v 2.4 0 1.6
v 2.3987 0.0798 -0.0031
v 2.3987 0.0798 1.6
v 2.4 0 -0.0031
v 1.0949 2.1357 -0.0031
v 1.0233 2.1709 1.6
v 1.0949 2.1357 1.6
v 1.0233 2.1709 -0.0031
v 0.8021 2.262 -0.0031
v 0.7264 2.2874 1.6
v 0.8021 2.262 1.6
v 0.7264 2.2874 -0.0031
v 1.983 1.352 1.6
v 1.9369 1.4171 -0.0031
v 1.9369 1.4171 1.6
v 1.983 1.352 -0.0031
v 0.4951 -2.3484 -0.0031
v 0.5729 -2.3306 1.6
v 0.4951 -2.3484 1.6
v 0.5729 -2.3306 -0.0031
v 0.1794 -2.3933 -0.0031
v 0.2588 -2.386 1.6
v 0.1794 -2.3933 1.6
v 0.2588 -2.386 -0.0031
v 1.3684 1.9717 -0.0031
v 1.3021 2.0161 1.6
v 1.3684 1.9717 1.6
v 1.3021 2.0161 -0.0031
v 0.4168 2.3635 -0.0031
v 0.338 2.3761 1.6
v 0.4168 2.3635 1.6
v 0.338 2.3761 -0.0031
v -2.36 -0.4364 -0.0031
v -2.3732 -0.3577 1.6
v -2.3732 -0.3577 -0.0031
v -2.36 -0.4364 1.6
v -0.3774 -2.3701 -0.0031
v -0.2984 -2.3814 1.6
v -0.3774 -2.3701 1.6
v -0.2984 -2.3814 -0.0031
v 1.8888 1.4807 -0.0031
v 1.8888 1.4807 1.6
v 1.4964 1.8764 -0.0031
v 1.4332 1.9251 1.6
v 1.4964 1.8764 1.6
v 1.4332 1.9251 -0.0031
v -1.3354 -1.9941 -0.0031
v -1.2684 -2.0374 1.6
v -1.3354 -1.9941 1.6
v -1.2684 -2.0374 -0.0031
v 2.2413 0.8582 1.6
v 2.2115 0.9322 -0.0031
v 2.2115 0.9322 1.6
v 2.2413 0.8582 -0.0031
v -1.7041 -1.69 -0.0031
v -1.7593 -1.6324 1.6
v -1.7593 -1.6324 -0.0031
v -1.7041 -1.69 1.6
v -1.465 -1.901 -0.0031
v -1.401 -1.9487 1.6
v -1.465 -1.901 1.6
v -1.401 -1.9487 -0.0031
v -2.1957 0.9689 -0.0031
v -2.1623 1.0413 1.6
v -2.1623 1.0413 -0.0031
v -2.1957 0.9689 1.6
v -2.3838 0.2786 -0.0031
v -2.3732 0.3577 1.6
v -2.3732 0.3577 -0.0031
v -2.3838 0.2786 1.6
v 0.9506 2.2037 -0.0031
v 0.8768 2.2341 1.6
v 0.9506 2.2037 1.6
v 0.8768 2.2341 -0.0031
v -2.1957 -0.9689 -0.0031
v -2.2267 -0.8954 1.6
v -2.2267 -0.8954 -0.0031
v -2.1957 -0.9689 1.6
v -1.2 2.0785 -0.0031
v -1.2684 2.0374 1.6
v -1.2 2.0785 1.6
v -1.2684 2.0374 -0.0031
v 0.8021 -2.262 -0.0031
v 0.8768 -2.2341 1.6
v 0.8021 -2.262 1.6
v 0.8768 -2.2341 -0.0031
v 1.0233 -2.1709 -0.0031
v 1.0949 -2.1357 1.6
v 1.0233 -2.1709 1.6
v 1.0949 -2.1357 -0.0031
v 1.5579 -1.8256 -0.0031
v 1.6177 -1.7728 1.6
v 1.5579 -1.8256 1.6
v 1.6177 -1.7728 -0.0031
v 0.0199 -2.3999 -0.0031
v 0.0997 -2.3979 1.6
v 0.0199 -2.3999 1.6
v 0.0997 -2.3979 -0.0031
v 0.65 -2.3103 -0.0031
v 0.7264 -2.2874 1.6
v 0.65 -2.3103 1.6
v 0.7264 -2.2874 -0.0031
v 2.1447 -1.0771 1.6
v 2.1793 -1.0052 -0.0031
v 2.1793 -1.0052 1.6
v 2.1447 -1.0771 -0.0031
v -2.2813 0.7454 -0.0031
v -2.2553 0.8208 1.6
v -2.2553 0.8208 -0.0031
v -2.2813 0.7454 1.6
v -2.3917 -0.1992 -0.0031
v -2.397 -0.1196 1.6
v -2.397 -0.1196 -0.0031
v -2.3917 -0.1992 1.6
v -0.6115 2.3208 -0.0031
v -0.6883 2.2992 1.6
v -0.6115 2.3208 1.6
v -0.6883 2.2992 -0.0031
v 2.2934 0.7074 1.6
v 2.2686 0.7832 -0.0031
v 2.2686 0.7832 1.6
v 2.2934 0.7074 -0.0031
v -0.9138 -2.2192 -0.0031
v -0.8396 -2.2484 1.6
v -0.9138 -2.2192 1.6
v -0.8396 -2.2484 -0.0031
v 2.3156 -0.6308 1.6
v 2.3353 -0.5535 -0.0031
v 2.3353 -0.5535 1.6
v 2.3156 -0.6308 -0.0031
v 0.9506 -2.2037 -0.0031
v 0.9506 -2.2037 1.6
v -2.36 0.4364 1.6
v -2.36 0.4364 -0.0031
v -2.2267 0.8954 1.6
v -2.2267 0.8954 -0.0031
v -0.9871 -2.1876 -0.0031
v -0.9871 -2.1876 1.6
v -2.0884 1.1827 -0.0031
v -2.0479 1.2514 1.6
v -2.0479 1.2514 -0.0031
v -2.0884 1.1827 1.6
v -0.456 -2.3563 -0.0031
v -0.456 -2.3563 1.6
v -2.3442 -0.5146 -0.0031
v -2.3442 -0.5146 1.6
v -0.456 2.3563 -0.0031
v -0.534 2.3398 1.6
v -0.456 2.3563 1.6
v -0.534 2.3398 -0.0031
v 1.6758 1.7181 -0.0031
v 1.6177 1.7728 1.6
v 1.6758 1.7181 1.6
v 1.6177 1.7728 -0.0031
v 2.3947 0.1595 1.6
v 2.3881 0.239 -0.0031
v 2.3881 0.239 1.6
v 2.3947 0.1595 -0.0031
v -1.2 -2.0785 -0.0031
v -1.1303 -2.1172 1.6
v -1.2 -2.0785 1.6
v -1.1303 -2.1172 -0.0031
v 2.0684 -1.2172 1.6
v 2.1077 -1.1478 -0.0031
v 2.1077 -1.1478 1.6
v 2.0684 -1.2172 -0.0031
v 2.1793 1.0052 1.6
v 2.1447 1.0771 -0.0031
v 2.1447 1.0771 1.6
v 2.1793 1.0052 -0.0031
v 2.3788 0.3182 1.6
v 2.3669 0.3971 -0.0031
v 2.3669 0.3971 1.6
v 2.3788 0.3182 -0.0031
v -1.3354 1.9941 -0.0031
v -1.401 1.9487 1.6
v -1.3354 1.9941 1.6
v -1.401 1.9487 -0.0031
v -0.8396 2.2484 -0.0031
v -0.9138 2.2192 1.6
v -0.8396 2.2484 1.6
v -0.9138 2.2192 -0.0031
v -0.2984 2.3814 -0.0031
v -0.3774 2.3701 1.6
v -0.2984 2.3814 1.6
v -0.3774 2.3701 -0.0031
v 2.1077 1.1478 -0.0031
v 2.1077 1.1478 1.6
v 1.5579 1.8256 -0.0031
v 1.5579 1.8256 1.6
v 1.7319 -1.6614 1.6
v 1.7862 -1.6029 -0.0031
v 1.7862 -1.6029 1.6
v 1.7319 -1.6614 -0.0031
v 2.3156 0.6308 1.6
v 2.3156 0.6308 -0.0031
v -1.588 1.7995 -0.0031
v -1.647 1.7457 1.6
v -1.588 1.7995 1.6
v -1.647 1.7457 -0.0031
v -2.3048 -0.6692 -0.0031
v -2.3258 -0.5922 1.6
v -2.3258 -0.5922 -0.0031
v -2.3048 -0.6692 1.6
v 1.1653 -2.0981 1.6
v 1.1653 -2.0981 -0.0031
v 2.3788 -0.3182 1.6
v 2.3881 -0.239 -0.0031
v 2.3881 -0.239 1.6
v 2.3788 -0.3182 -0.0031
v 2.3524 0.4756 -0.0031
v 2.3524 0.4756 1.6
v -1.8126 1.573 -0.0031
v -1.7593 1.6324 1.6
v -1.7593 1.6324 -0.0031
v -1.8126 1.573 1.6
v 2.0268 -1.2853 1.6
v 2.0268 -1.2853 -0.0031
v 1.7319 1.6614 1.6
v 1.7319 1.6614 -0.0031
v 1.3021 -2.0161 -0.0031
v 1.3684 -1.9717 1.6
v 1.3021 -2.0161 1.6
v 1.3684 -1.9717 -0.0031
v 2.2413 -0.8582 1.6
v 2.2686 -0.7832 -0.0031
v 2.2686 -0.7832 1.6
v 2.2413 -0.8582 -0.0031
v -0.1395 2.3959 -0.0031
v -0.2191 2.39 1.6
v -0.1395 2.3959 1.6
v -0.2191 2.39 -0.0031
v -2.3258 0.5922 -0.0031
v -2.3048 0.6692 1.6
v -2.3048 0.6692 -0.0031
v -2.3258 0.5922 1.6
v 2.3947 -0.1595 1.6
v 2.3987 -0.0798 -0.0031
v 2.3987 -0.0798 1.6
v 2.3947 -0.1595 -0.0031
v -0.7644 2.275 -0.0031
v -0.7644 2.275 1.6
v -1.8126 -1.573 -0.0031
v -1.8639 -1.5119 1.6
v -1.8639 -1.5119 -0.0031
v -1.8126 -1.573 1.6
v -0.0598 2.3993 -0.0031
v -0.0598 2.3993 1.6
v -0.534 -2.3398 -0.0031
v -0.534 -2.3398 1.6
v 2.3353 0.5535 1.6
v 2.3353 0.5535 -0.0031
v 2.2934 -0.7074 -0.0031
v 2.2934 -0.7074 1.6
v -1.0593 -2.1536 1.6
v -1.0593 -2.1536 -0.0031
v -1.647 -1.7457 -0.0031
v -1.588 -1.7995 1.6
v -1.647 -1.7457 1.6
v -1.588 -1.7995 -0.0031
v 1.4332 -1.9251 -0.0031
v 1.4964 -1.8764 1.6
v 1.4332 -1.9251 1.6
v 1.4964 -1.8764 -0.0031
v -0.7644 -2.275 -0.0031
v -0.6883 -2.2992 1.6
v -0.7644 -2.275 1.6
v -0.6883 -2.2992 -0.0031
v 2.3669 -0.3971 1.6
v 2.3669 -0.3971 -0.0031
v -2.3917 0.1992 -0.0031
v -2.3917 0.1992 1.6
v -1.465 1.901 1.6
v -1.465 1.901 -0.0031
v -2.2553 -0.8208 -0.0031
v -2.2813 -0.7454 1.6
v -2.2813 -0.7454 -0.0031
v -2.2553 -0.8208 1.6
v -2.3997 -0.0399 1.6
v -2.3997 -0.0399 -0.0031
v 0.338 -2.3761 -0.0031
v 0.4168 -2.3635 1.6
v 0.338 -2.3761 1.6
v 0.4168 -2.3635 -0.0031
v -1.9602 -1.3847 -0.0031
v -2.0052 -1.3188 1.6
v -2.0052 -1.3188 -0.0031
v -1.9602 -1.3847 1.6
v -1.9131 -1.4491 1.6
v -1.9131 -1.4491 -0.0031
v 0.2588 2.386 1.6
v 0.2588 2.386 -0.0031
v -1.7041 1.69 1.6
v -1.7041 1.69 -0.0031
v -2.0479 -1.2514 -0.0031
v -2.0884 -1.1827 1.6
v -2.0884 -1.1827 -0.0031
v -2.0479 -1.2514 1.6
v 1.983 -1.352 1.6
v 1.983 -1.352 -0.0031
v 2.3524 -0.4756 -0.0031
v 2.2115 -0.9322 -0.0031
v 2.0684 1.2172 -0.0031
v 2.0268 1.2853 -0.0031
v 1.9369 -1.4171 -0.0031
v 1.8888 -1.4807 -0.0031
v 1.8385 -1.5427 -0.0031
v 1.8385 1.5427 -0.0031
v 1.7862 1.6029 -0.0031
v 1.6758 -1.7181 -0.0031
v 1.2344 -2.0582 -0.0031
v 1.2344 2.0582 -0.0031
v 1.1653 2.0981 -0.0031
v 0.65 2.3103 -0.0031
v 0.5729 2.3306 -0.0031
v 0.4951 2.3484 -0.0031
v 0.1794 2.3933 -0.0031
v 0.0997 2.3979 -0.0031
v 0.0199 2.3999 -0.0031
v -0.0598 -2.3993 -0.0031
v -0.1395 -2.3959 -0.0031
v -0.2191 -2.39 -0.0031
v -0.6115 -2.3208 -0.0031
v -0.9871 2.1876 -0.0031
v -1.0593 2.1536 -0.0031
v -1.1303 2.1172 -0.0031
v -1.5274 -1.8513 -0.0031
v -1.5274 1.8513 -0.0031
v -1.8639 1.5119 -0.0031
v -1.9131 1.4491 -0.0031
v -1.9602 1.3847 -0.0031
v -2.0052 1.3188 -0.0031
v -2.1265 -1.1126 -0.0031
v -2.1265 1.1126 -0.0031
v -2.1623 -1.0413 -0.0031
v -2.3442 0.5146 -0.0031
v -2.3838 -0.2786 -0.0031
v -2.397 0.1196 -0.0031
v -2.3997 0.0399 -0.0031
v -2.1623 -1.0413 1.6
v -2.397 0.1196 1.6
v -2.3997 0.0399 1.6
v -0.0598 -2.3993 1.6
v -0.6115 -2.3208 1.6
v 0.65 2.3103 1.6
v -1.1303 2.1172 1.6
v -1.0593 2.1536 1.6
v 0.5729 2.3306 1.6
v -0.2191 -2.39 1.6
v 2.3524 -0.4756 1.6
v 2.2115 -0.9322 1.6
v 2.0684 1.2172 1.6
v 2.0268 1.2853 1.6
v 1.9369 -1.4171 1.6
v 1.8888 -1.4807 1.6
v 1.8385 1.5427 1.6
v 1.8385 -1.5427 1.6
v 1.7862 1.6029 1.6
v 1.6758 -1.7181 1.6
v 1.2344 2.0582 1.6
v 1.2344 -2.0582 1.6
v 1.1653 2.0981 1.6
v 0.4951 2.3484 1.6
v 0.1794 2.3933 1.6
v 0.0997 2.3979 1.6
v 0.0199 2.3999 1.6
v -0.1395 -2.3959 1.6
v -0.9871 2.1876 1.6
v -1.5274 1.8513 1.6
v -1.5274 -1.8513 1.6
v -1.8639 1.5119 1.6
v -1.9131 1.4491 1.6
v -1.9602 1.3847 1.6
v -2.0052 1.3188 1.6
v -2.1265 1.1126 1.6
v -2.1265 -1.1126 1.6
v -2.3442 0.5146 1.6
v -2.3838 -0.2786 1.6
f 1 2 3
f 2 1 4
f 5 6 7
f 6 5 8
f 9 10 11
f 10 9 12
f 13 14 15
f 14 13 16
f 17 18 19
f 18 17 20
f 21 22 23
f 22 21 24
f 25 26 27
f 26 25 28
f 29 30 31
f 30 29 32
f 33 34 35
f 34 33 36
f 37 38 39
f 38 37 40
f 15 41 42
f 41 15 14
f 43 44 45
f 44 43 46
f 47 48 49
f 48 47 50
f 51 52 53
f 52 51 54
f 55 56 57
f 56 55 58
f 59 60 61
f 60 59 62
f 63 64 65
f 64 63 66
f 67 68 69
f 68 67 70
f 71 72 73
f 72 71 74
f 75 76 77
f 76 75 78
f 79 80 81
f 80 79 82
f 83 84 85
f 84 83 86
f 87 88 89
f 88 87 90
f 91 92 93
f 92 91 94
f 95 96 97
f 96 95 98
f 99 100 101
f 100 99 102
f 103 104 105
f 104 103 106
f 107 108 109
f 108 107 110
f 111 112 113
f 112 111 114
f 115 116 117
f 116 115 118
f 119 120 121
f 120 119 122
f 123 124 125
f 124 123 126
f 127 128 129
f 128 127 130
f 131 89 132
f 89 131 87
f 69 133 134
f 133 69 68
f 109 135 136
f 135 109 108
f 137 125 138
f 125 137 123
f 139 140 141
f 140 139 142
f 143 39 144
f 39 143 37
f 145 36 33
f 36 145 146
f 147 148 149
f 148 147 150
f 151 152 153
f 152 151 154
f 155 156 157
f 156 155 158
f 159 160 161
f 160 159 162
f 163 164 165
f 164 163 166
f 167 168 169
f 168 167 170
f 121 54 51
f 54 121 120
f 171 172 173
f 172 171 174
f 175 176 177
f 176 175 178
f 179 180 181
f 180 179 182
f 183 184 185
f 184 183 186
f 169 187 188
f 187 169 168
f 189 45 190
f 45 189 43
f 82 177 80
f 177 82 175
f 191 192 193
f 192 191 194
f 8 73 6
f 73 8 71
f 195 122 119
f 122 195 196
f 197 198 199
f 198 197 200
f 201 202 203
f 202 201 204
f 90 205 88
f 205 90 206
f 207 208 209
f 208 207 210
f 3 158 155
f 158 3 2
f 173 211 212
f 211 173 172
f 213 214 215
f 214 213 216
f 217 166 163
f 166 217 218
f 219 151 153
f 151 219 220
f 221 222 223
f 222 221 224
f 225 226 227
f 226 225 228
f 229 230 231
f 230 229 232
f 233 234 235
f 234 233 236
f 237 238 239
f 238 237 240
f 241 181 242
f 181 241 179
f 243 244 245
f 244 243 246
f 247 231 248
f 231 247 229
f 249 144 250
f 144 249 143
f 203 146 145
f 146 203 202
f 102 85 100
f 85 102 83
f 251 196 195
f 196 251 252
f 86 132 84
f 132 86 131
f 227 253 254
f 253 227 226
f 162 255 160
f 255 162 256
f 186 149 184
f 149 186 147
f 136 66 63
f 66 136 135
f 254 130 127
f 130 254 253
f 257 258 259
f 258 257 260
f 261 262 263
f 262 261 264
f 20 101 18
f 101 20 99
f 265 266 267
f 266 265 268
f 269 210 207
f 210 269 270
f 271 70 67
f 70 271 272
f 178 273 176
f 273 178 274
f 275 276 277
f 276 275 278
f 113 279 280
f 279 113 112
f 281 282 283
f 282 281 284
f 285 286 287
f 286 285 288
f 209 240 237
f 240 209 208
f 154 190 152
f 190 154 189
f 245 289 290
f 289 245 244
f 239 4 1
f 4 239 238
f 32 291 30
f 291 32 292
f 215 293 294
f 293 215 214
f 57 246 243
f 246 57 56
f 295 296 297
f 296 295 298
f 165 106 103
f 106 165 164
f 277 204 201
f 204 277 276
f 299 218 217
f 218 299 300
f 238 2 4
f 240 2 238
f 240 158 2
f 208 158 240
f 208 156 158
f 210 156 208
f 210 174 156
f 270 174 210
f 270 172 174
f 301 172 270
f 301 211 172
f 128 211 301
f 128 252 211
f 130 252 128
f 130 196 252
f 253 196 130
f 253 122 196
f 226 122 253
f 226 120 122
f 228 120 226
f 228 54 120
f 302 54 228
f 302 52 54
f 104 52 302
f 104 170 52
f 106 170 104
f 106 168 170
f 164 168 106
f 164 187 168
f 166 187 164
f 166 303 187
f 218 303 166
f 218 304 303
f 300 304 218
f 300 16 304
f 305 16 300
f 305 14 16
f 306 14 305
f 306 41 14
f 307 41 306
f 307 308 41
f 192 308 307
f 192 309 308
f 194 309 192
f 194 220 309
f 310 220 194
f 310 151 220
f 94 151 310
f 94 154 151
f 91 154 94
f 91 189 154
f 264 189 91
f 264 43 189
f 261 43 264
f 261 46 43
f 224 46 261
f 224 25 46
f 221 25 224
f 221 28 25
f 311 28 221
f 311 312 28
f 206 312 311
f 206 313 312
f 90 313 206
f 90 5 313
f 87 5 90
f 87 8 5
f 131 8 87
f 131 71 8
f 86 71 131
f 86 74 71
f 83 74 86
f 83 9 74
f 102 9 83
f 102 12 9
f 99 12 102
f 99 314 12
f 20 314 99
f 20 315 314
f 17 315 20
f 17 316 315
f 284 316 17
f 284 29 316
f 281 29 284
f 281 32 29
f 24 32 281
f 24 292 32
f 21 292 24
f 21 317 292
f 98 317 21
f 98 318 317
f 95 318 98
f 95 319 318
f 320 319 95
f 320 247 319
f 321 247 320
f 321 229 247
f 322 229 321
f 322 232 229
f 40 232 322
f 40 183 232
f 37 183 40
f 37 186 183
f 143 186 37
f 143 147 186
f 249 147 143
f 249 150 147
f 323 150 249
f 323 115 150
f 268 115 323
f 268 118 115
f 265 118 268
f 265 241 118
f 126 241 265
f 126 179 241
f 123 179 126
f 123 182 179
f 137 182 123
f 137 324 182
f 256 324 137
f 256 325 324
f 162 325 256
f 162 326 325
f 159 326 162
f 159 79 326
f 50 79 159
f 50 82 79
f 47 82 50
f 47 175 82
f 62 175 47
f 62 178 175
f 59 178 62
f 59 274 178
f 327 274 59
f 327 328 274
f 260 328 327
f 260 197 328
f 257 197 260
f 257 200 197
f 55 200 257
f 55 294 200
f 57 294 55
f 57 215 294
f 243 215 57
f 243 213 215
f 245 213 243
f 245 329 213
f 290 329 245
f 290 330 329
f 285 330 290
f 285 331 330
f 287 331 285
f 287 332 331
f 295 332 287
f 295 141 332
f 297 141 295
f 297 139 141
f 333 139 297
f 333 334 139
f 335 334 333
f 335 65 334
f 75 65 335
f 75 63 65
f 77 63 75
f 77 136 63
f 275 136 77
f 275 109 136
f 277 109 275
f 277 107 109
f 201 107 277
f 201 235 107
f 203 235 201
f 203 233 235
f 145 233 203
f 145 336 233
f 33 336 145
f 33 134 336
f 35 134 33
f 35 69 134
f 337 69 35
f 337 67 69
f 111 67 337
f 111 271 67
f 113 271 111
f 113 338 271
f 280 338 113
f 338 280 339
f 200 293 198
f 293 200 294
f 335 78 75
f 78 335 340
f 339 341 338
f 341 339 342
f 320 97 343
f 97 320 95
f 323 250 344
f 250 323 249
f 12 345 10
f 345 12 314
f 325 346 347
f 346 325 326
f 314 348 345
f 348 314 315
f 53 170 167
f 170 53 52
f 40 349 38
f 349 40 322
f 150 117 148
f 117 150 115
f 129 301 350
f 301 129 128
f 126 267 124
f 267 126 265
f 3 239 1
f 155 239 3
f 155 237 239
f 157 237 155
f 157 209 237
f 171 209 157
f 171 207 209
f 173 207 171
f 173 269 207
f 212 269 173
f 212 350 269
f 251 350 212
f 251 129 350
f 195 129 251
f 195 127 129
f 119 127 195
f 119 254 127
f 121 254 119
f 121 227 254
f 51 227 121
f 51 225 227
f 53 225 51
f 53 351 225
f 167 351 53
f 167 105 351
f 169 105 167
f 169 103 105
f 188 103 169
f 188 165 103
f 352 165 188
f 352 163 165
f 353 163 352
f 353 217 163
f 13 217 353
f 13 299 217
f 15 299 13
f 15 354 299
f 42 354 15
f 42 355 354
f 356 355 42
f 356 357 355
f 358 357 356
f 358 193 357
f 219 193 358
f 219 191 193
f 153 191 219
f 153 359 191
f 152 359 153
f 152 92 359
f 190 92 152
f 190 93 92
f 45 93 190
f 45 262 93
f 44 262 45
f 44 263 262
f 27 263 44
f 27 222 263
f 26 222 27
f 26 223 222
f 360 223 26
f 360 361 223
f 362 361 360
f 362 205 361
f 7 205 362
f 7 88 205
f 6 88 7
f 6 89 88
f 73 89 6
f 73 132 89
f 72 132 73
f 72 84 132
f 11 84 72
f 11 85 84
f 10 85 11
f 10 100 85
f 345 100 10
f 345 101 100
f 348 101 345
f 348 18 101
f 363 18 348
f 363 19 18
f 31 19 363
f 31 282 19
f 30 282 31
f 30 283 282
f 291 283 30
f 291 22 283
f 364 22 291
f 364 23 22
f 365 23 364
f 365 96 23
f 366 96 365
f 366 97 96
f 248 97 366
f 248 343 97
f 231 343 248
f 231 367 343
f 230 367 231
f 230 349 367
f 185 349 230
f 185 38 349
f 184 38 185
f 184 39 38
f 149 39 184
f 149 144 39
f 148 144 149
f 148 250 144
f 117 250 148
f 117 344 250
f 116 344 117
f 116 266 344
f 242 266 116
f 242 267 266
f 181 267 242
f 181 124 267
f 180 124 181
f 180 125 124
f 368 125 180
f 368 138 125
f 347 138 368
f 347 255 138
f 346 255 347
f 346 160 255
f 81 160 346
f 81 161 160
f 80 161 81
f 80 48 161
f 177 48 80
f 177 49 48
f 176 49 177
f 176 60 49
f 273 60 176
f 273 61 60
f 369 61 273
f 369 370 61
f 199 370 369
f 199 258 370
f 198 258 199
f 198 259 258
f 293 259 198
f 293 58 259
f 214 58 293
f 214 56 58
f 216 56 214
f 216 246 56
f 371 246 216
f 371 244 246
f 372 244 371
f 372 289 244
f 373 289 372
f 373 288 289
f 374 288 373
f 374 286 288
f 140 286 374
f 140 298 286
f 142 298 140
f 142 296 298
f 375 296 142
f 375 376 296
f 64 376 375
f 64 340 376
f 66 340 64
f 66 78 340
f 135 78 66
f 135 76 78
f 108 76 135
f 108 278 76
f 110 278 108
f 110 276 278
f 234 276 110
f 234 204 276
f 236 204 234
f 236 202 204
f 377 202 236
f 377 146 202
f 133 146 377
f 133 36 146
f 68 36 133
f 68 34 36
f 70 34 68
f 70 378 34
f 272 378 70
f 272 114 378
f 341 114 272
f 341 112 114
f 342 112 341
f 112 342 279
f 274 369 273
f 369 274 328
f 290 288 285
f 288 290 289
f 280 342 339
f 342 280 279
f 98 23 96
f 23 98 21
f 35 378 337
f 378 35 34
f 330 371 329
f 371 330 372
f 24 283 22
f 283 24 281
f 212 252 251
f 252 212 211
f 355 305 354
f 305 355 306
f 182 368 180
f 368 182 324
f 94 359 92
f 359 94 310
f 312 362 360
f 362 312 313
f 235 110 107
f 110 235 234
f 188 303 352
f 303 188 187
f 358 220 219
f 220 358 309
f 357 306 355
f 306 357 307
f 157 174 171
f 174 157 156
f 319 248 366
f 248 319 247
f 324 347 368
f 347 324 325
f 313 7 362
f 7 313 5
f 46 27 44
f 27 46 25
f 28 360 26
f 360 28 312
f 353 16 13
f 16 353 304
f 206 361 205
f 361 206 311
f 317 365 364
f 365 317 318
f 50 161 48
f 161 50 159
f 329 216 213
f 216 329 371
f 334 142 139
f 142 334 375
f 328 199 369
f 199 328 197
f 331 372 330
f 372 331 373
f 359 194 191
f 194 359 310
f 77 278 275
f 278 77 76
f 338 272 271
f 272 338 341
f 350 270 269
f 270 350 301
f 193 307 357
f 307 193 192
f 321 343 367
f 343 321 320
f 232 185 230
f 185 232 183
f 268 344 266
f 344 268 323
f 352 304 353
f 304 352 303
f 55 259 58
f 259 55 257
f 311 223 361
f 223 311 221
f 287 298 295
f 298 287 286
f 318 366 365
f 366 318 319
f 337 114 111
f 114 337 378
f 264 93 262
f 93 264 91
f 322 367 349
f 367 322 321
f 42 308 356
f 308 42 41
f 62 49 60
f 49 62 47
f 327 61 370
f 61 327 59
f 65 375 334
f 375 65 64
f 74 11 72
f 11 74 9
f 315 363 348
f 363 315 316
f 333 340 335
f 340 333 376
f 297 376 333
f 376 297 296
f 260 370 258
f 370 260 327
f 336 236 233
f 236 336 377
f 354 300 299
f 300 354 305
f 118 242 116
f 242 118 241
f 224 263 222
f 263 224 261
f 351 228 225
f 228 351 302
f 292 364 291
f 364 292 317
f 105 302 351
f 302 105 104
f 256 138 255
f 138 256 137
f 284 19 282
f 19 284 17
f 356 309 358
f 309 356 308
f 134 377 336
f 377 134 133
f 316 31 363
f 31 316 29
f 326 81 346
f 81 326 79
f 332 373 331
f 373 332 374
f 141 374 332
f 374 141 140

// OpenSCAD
use <../lib.scad>
use <../p/2-4chrd.scad>
use <../p/2-4cylo.scad>
use <../p/2-4ring3.scad>
use <../p/2-4ring4.scad>
use <../p/4-4cylo.scad>
use <../p/box4-4a.scad>
use <../p/phandle1.scad>
use <../p/rect.scad>
use <../p/rect2p.scad>
use <../p/stud.scad>
$fa=1; $fs=0.2;
function ldraw_lib__26047(realsolid=false) = [
// 0 Plate  1 x  1 Round with Horizontal Handle on Side
// 0 Name: 26047.dat
// 0 Author: Magnus Forsberg [MagFors]
// 0 !LDRAW_ORG Part UPDATE 2022-06
// 0 !LICENSE Licensed under CC BY 2.0 and CC BY 4.0 : see CAreadme.txt
// 
// 0 BFC CERTIFY CCW
  [0,"BFC","CERTIFY"],
  [0,"BFC","CCW"],
// 
// 0 !HISTORY 2016-12-31 [PTadmin] Official Update 2016-01
// 0 !HISTORY 2021-11-03 [MagFors] used handle primitive
// 0 !HISTORY 2022-12-20 [PTadmin] Official Update 2022-06
// 
// 
// 1 16 0 0 0 0 0 -1 0 1 0 1 0 0 stud.dat
  [1,16,0,0,0,0,0,-1,0,1,0,1,0,0, ldraw_lib__stud(realsolid)],
// 0 BFC INVERTNEXT
  [0,"BFC","INVERTNEXT"],
// 1 16 0 8 -3 6 0 0 0 -4 0 0 0 -3 box4-4a.dat
  [1,16,0,8,-3,6,0,0,0,-4,0,0,0,-3, ldraw_lib__box4_4a(realsolid)],
// 0 BFC INVERTNEXT
  [0,"BFC","INVERTNEXT"],
// 1 16 0 4 0 6 0 0 0 4 0 0 0 6 2-4cylo.dat
  [1,16,0,4,0,6,0,0,0,4,0,0,0,6, ldraw_lib__2_4cylo(realsolid)],
// 1 16 0 4 0 6 0 0 0 -1 0 0 0 6 2-4chrd.dat
  [1,16,0,4,0,6,0,0,0,-1,0,0,0,6, ldraw_lib__2_4chrd(realsolid)],
// 1 16 0 8 0 2 0 0 0 -1 0 0 0 2 2-4ring3.dat
  [1,16,0,8,0,2,0,0,0,-1,0,0,0,2, ldraw_lib__2_4ring3(realsolid)],
// 1 16 0 8 0 2 0 0 0 -1 0 0 0 2 2-4ring4.dat
  [1,16,0,8,0,2,0,0,0,-1,0,0,0,2, ldraw_lib__2_4ring4(realsolid)],
// 3 16 -8 8 0 -6 8 0 -6 8 -6
  [3,16,-8,8,0,-6,8,0,-6,8,-6],
// 4 16 -8 8 0 -6 8 -6 -10 8 -10 -10 8 0
  [4,16,-8,8,0,-6,8,-6,-10,8,-10,-10,8,0],
// 4 16 10 8 -10 6 8 -6 8 8 0 10 8 0
  [4,16,10,8,-10,6,8,-6,8,8,0,10,8,0],
// 3 16 6 8 0 8 8 0 6 8 -6
  [3,16,6,8,0,8,8,0,6,8,-6],
// 4 16 -4 8 -10 -6 8 -6 6 8 -6 4 8 -10
  [4,16,-4,8,-10,-6,8,-6,6,8,-6,4,8,-10],
// 3 16 -10 8 -10 -6 8 -6 -4 8 -10
  [3,16,-10,8,-10,-6,8,-6,-4,8,-10],
// 3 16 4 8 -10 6 8 -6 10 8 -10
  [3,16,4,8,-10,6,8,-6,10,8,-10],
// 1 16 0 0 0 10 0 0 0 8 0 0 0 10 2-4cylo.dat
  [1,16,0,0,0,10,0,0,0,8,0,0,0,10, ldraw_lib__2_4cylo(realsolid)],
// 1 16 0 0 0 10 0 0 0 1 0 0 0 10 2-4chrd.dat
  [1,16,0,0,0,10,0,0,0,1,0,0,0,10, ldraw_lib__2_4chrd(realsolid)],
// 1 16 0 4 -10 0 0 -4 4 0 0 0 1 0 rect.dat
  [1,16,0,4,-10,0,0,-4,4,0,0,0,1,0, ldraw_lib__rect(realsolid)],
// 1 16 4 2 -20 0 -8 0 4 0 0 0 0 4 4-4cylo.dat
  [1,16,4,2,-20,0,-8,0,4,0,0,0,0,4, ldraw_lib__4_4cylo(realsolid)],
// 1 16 10 4 -5 0 -1 0 0 0 -4 5 0 0 rect2p.dat
  [1,16,10,4,-5,0,-1,0,0,0,-4,5,0,0, ldraw_lib__rect2p(realsolid)],
// 1 16 -10 4 -5 0 1 0 0 0 -4 -5 0 0 rect2p.dat
  [1,16,-10,4,-5,0,1,0,0,0,-4,-5,0,0, ldraw_lib__rect2p(realsolid)],
// 4 16 -4 0 -10 4 0 -10 10 0 0 -10 0 0
  [4,16,-4,0,-10,4,0,-10,10,0,0,-10,0,0],
// 3 16 4 0 -10 10 0 -10 10 0 0
  [3,16,4,0,-10,10,0,-10,10,0,0],
// 3 16 -10 0 -10 -4 0 -10 -10 0 0
  [3,16,-10,0,-10,-4,0,-10,-10,0,0],
// 1 16 -7 0 -20 1 0 0 0 1 0 0 0 1 phandle1.dat
  [1,16,-7,0,-20,1,0,0,0,1,0,0,0,1, ldraw_lib__phandle1(realsolid)],
// 1 16 7 0 -20 -1 0 0 0 1 0 0 0 1 phandle1.dat
  [1,16,7,0,-20,-1,0,0,0,1,0,0,0,1, ldraw_lib__phandle1(realsolid)],
];
module ldraw_lib__26047(step=0, col=false, unit=2/5, alt=false, line=0.2, solid=!$preview)
    makepoly(ldraw_lib__26047(solid), step=step, col=col, unit=unit, alt=alt, line=line, solid=solid);
ldraw_lib__26047(line=0.2);
